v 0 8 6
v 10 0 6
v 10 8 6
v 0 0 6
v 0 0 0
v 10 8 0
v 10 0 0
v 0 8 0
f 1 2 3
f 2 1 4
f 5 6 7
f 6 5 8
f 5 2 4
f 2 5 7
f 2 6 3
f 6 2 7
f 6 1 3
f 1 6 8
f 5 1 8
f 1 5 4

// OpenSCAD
size = [10, 8, 6];
centered = false;

cube(size = size, center = centered);
